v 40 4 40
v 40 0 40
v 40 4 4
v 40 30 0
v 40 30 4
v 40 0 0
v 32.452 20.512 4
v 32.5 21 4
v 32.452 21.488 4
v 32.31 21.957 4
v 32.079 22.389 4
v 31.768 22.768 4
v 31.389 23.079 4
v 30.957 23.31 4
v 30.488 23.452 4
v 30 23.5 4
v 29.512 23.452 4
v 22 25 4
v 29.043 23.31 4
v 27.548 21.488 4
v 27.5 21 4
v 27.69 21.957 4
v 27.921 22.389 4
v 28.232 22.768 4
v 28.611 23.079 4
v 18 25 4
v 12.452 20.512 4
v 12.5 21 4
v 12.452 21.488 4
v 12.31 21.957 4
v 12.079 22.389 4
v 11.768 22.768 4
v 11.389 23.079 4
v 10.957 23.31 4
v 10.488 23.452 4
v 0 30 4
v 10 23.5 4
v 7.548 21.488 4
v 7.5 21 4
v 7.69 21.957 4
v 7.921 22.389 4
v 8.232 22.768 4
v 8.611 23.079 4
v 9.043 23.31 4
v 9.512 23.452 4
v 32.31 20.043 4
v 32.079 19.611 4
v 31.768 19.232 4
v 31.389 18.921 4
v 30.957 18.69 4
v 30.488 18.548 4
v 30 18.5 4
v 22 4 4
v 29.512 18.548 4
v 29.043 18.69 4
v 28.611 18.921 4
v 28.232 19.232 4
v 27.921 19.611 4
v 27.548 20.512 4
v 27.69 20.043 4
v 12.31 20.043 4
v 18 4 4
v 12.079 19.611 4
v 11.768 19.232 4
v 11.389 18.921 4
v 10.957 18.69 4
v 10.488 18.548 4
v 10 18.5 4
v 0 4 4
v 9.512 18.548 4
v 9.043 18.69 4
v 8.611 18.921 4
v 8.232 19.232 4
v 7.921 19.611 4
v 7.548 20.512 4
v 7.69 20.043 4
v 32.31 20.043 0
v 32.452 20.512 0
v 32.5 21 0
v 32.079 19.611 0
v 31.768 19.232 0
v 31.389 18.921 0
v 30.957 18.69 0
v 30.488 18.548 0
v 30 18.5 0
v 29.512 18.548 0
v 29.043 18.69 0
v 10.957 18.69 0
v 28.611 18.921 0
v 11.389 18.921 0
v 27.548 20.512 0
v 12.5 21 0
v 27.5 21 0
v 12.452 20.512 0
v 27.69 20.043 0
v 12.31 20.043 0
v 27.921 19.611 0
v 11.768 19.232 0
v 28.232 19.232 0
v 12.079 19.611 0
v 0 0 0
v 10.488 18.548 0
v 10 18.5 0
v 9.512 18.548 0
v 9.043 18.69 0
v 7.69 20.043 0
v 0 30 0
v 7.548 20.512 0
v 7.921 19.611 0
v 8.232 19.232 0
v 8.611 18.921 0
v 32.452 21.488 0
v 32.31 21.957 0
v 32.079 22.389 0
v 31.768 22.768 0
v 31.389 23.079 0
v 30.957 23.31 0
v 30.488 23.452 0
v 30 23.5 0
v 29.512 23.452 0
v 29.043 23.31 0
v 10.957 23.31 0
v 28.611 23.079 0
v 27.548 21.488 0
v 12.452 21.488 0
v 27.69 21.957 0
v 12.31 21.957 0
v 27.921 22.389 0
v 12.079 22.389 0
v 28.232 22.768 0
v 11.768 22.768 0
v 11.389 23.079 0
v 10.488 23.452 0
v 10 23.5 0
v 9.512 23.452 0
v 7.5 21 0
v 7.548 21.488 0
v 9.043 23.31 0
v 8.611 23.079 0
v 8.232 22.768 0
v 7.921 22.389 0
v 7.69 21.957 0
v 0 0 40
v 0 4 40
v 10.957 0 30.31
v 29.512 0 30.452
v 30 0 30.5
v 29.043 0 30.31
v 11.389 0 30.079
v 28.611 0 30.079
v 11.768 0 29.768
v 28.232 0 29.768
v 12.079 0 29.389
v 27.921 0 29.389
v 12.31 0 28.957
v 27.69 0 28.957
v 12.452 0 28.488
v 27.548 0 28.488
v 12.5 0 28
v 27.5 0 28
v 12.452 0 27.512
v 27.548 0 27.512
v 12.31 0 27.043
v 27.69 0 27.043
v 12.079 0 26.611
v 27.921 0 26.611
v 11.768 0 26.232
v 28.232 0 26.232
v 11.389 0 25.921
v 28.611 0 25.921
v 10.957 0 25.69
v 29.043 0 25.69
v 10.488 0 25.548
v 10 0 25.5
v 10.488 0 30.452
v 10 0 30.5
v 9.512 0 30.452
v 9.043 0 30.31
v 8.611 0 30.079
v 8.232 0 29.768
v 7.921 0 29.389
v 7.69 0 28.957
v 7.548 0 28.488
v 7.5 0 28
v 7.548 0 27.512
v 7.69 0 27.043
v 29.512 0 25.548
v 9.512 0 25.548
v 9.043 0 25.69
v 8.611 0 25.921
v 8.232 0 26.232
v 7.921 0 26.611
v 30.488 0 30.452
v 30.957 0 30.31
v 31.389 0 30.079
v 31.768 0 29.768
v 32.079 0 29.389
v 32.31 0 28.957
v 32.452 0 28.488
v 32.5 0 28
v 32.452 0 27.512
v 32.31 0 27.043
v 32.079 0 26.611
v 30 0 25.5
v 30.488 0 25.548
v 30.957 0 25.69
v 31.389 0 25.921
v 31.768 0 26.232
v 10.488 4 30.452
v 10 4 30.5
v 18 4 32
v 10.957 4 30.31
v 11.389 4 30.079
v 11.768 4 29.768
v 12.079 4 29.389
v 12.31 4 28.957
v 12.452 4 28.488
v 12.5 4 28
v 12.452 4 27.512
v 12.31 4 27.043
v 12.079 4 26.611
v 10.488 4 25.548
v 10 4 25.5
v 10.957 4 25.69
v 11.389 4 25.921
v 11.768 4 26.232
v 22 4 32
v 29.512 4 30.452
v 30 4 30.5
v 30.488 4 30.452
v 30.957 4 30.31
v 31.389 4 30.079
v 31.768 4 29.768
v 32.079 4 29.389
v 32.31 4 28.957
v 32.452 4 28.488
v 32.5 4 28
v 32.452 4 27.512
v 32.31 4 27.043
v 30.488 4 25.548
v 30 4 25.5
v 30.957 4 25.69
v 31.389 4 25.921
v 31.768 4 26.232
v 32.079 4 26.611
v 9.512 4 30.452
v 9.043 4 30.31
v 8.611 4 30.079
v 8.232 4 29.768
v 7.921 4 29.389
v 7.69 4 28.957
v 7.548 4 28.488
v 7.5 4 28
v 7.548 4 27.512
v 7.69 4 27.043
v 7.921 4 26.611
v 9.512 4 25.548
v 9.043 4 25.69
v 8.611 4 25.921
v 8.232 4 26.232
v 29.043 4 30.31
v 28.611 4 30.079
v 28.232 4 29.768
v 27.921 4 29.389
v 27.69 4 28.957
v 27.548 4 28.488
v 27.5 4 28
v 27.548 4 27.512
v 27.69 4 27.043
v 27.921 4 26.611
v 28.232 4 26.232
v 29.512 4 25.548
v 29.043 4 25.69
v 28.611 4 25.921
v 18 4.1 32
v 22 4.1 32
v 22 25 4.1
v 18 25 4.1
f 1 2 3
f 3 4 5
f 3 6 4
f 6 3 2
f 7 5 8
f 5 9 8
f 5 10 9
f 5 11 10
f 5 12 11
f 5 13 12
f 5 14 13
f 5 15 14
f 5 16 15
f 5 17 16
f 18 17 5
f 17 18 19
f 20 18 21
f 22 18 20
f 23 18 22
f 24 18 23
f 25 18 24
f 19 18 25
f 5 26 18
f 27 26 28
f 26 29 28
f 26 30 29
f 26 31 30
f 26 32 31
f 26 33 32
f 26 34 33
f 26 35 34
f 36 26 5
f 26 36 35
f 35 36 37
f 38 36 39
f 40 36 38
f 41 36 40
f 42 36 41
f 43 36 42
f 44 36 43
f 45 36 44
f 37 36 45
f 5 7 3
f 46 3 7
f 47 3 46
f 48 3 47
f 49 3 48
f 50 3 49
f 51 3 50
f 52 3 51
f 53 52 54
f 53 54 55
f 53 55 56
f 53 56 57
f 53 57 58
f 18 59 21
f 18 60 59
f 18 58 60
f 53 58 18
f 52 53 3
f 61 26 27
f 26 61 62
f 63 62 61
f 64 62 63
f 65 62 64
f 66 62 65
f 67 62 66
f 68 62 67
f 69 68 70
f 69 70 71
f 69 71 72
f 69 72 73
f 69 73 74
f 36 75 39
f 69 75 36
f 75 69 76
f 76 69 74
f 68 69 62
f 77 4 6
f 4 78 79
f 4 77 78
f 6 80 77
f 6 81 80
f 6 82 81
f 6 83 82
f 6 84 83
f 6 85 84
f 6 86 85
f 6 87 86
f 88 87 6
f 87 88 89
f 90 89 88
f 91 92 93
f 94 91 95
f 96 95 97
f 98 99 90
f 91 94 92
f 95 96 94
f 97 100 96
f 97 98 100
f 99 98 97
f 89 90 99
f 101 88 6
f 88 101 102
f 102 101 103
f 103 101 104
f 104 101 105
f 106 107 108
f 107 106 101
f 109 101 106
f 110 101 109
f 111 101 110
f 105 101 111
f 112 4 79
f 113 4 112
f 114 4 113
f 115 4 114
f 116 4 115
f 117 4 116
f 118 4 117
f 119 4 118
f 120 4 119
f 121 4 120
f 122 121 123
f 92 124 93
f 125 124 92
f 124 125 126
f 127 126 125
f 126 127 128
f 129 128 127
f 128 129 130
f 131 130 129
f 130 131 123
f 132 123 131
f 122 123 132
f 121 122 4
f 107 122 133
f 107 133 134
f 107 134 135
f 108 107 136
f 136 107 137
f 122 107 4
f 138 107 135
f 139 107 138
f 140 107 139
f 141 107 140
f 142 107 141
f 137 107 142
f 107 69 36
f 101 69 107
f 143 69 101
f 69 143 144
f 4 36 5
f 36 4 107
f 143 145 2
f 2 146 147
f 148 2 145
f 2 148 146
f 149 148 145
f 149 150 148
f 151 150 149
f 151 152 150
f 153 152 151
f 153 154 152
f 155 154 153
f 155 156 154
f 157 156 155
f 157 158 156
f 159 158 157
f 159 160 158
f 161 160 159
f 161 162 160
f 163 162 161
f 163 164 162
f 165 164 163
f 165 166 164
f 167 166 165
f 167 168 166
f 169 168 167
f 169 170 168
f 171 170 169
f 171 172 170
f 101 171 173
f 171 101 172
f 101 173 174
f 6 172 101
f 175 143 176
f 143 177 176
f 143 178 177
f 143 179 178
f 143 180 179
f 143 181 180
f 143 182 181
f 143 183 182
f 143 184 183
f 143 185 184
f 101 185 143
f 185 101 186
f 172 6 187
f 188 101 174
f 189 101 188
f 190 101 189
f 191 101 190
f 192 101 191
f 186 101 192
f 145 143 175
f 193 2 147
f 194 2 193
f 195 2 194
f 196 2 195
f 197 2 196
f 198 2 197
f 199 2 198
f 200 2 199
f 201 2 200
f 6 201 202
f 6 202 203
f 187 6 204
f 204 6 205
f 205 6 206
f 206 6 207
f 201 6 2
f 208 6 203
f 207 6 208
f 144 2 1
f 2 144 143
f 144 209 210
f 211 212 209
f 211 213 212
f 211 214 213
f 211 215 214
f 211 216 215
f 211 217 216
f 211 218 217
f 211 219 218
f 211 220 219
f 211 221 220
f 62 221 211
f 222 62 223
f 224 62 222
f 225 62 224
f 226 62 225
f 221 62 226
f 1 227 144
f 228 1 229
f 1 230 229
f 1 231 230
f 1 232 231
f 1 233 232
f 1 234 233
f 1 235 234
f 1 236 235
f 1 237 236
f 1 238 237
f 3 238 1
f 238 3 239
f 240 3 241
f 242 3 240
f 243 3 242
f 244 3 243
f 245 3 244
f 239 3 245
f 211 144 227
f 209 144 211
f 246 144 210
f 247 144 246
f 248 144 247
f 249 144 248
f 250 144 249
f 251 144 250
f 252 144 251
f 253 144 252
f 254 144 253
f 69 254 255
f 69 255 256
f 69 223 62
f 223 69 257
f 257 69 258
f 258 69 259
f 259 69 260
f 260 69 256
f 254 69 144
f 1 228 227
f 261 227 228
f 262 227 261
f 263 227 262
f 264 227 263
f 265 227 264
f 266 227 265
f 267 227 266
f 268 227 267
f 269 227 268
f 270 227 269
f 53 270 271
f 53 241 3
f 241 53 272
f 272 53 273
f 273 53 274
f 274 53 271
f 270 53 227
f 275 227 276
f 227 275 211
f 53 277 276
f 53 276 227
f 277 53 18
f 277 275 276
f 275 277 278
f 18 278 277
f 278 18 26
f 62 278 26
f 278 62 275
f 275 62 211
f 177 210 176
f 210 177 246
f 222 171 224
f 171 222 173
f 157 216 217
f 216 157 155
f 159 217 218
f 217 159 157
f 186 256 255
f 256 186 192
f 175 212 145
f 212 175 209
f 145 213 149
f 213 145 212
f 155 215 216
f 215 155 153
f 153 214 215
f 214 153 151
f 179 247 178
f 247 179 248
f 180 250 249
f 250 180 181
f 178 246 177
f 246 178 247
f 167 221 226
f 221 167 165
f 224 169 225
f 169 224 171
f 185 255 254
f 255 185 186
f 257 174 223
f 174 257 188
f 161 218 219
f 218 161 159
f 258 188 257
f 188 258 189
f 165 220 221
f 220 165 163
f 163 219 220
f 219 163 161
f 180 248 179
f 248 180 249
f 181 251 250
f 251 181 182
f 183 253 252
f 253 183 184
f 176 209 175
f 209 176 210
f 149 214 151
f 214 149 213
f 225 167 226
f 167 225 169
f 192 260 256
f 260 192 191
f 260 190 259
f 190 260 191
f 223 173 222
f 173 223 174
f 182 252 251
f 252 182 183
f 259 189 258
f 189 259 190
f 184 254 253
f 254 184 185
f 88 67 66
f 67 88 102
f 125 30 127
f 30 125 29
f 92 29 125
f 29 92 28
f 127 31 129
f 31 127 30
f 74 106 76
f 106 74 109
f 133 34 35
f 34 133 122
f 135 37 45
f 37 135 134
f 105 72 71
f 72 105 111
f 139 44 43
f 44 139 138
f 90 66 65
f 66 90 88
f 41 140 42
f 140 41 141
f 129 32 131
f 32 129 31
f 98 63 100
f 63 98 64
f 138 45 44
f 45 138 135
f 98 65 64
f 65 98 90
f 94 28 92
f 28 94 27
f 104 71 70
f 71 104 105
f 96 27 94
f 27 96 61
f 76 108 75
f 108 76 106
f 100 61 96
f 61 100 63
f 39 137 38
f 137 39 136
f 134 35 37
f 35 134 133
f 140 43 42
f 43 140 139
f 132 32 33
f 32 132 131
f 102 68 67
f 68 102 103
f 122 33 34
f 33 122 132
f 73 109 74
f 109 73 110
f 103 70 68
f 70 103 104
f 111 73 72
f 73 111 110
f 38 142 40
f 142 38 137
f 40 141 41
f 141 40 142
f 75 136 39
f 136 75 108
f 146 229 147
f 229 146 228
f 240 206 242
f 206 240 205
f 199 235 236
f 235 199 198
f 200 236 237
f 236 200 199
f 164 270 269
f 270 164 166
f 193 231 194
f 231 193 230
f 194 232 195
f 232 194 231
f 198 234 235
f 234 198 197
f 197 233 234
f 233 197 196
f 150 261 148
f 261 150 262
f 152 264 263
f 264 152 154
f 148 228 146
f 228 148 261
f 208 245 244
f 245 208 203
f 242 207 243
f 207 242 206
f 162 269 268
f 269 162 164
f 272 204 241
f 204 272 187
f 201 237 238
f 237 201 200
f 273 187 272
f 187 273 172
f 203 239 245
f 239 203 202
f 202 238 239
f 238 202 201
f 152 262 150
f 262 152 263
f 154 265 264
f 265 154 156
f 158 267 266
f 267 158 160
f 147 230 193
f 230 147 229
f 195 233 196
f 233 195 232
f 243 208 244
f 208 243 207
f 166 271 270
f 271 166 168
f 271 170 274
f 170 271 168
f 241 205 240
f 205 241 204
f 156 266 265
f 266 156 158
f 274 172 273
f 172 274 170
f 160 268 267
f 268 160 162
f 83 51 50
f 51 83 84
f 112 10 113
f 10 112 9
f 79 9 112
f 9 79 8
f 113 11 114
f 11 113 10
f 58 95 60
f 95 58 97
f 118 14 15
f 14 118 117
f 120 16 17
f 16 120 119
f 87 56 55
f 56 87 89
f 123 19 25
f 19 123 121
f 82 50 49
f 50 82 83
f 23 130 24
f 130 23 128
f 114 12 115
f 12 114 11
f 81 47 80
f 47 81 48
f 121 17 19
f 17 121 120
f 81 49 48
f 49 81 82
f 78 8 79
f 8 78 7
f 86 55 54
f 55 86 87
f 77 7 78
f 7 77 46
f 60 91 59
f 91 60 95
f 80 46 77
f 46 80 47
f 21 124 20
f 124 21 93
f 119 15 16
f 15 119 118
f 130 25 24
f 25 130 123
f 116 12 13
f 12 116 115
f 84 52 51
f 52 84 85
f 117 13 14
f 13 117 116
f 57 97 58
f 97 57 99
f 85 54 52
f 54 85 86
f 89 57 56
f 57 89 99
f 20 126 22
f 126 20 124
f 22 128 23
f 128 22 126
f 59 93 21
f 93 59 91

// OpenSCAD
// Shelf bracket: screw holes marked with #, the shelf board as % (not printed).
width = 40;          // [30:5:60]
height = 40;
depth = 30;
thickness = 4;
hole = 5;            // [3:0.5:6]

$fn = 32;

module screw_hole() #cylinder(d = hole, h = thickness * 3, center = true);

difference() {
    union() {
        cube([width, depth, thickness]);
        cube([width, thickness, height]);
        // Gusset in the middle
        hull() {
            translate([width / 2 - 2, thickness, thickness]) cube([4, 0.1, height * 0.7]);
            translate([width / 2 - 2, thickness, thickness]) cube([4, depth * 0.7, 0.1]);
        }
    }
    for (x = [width * 0.25, width * 0.75]) {
        translate([x, thickness / 2, height * 0.7]) rotate([90, 0, 0]) screw_hole();
        translate([x, depth * 0.7, thickness / 2]) screw_hole();
    }
}

%translate([-10, 0, thickness]) cube([width + 20, depth + 20, 18]);
